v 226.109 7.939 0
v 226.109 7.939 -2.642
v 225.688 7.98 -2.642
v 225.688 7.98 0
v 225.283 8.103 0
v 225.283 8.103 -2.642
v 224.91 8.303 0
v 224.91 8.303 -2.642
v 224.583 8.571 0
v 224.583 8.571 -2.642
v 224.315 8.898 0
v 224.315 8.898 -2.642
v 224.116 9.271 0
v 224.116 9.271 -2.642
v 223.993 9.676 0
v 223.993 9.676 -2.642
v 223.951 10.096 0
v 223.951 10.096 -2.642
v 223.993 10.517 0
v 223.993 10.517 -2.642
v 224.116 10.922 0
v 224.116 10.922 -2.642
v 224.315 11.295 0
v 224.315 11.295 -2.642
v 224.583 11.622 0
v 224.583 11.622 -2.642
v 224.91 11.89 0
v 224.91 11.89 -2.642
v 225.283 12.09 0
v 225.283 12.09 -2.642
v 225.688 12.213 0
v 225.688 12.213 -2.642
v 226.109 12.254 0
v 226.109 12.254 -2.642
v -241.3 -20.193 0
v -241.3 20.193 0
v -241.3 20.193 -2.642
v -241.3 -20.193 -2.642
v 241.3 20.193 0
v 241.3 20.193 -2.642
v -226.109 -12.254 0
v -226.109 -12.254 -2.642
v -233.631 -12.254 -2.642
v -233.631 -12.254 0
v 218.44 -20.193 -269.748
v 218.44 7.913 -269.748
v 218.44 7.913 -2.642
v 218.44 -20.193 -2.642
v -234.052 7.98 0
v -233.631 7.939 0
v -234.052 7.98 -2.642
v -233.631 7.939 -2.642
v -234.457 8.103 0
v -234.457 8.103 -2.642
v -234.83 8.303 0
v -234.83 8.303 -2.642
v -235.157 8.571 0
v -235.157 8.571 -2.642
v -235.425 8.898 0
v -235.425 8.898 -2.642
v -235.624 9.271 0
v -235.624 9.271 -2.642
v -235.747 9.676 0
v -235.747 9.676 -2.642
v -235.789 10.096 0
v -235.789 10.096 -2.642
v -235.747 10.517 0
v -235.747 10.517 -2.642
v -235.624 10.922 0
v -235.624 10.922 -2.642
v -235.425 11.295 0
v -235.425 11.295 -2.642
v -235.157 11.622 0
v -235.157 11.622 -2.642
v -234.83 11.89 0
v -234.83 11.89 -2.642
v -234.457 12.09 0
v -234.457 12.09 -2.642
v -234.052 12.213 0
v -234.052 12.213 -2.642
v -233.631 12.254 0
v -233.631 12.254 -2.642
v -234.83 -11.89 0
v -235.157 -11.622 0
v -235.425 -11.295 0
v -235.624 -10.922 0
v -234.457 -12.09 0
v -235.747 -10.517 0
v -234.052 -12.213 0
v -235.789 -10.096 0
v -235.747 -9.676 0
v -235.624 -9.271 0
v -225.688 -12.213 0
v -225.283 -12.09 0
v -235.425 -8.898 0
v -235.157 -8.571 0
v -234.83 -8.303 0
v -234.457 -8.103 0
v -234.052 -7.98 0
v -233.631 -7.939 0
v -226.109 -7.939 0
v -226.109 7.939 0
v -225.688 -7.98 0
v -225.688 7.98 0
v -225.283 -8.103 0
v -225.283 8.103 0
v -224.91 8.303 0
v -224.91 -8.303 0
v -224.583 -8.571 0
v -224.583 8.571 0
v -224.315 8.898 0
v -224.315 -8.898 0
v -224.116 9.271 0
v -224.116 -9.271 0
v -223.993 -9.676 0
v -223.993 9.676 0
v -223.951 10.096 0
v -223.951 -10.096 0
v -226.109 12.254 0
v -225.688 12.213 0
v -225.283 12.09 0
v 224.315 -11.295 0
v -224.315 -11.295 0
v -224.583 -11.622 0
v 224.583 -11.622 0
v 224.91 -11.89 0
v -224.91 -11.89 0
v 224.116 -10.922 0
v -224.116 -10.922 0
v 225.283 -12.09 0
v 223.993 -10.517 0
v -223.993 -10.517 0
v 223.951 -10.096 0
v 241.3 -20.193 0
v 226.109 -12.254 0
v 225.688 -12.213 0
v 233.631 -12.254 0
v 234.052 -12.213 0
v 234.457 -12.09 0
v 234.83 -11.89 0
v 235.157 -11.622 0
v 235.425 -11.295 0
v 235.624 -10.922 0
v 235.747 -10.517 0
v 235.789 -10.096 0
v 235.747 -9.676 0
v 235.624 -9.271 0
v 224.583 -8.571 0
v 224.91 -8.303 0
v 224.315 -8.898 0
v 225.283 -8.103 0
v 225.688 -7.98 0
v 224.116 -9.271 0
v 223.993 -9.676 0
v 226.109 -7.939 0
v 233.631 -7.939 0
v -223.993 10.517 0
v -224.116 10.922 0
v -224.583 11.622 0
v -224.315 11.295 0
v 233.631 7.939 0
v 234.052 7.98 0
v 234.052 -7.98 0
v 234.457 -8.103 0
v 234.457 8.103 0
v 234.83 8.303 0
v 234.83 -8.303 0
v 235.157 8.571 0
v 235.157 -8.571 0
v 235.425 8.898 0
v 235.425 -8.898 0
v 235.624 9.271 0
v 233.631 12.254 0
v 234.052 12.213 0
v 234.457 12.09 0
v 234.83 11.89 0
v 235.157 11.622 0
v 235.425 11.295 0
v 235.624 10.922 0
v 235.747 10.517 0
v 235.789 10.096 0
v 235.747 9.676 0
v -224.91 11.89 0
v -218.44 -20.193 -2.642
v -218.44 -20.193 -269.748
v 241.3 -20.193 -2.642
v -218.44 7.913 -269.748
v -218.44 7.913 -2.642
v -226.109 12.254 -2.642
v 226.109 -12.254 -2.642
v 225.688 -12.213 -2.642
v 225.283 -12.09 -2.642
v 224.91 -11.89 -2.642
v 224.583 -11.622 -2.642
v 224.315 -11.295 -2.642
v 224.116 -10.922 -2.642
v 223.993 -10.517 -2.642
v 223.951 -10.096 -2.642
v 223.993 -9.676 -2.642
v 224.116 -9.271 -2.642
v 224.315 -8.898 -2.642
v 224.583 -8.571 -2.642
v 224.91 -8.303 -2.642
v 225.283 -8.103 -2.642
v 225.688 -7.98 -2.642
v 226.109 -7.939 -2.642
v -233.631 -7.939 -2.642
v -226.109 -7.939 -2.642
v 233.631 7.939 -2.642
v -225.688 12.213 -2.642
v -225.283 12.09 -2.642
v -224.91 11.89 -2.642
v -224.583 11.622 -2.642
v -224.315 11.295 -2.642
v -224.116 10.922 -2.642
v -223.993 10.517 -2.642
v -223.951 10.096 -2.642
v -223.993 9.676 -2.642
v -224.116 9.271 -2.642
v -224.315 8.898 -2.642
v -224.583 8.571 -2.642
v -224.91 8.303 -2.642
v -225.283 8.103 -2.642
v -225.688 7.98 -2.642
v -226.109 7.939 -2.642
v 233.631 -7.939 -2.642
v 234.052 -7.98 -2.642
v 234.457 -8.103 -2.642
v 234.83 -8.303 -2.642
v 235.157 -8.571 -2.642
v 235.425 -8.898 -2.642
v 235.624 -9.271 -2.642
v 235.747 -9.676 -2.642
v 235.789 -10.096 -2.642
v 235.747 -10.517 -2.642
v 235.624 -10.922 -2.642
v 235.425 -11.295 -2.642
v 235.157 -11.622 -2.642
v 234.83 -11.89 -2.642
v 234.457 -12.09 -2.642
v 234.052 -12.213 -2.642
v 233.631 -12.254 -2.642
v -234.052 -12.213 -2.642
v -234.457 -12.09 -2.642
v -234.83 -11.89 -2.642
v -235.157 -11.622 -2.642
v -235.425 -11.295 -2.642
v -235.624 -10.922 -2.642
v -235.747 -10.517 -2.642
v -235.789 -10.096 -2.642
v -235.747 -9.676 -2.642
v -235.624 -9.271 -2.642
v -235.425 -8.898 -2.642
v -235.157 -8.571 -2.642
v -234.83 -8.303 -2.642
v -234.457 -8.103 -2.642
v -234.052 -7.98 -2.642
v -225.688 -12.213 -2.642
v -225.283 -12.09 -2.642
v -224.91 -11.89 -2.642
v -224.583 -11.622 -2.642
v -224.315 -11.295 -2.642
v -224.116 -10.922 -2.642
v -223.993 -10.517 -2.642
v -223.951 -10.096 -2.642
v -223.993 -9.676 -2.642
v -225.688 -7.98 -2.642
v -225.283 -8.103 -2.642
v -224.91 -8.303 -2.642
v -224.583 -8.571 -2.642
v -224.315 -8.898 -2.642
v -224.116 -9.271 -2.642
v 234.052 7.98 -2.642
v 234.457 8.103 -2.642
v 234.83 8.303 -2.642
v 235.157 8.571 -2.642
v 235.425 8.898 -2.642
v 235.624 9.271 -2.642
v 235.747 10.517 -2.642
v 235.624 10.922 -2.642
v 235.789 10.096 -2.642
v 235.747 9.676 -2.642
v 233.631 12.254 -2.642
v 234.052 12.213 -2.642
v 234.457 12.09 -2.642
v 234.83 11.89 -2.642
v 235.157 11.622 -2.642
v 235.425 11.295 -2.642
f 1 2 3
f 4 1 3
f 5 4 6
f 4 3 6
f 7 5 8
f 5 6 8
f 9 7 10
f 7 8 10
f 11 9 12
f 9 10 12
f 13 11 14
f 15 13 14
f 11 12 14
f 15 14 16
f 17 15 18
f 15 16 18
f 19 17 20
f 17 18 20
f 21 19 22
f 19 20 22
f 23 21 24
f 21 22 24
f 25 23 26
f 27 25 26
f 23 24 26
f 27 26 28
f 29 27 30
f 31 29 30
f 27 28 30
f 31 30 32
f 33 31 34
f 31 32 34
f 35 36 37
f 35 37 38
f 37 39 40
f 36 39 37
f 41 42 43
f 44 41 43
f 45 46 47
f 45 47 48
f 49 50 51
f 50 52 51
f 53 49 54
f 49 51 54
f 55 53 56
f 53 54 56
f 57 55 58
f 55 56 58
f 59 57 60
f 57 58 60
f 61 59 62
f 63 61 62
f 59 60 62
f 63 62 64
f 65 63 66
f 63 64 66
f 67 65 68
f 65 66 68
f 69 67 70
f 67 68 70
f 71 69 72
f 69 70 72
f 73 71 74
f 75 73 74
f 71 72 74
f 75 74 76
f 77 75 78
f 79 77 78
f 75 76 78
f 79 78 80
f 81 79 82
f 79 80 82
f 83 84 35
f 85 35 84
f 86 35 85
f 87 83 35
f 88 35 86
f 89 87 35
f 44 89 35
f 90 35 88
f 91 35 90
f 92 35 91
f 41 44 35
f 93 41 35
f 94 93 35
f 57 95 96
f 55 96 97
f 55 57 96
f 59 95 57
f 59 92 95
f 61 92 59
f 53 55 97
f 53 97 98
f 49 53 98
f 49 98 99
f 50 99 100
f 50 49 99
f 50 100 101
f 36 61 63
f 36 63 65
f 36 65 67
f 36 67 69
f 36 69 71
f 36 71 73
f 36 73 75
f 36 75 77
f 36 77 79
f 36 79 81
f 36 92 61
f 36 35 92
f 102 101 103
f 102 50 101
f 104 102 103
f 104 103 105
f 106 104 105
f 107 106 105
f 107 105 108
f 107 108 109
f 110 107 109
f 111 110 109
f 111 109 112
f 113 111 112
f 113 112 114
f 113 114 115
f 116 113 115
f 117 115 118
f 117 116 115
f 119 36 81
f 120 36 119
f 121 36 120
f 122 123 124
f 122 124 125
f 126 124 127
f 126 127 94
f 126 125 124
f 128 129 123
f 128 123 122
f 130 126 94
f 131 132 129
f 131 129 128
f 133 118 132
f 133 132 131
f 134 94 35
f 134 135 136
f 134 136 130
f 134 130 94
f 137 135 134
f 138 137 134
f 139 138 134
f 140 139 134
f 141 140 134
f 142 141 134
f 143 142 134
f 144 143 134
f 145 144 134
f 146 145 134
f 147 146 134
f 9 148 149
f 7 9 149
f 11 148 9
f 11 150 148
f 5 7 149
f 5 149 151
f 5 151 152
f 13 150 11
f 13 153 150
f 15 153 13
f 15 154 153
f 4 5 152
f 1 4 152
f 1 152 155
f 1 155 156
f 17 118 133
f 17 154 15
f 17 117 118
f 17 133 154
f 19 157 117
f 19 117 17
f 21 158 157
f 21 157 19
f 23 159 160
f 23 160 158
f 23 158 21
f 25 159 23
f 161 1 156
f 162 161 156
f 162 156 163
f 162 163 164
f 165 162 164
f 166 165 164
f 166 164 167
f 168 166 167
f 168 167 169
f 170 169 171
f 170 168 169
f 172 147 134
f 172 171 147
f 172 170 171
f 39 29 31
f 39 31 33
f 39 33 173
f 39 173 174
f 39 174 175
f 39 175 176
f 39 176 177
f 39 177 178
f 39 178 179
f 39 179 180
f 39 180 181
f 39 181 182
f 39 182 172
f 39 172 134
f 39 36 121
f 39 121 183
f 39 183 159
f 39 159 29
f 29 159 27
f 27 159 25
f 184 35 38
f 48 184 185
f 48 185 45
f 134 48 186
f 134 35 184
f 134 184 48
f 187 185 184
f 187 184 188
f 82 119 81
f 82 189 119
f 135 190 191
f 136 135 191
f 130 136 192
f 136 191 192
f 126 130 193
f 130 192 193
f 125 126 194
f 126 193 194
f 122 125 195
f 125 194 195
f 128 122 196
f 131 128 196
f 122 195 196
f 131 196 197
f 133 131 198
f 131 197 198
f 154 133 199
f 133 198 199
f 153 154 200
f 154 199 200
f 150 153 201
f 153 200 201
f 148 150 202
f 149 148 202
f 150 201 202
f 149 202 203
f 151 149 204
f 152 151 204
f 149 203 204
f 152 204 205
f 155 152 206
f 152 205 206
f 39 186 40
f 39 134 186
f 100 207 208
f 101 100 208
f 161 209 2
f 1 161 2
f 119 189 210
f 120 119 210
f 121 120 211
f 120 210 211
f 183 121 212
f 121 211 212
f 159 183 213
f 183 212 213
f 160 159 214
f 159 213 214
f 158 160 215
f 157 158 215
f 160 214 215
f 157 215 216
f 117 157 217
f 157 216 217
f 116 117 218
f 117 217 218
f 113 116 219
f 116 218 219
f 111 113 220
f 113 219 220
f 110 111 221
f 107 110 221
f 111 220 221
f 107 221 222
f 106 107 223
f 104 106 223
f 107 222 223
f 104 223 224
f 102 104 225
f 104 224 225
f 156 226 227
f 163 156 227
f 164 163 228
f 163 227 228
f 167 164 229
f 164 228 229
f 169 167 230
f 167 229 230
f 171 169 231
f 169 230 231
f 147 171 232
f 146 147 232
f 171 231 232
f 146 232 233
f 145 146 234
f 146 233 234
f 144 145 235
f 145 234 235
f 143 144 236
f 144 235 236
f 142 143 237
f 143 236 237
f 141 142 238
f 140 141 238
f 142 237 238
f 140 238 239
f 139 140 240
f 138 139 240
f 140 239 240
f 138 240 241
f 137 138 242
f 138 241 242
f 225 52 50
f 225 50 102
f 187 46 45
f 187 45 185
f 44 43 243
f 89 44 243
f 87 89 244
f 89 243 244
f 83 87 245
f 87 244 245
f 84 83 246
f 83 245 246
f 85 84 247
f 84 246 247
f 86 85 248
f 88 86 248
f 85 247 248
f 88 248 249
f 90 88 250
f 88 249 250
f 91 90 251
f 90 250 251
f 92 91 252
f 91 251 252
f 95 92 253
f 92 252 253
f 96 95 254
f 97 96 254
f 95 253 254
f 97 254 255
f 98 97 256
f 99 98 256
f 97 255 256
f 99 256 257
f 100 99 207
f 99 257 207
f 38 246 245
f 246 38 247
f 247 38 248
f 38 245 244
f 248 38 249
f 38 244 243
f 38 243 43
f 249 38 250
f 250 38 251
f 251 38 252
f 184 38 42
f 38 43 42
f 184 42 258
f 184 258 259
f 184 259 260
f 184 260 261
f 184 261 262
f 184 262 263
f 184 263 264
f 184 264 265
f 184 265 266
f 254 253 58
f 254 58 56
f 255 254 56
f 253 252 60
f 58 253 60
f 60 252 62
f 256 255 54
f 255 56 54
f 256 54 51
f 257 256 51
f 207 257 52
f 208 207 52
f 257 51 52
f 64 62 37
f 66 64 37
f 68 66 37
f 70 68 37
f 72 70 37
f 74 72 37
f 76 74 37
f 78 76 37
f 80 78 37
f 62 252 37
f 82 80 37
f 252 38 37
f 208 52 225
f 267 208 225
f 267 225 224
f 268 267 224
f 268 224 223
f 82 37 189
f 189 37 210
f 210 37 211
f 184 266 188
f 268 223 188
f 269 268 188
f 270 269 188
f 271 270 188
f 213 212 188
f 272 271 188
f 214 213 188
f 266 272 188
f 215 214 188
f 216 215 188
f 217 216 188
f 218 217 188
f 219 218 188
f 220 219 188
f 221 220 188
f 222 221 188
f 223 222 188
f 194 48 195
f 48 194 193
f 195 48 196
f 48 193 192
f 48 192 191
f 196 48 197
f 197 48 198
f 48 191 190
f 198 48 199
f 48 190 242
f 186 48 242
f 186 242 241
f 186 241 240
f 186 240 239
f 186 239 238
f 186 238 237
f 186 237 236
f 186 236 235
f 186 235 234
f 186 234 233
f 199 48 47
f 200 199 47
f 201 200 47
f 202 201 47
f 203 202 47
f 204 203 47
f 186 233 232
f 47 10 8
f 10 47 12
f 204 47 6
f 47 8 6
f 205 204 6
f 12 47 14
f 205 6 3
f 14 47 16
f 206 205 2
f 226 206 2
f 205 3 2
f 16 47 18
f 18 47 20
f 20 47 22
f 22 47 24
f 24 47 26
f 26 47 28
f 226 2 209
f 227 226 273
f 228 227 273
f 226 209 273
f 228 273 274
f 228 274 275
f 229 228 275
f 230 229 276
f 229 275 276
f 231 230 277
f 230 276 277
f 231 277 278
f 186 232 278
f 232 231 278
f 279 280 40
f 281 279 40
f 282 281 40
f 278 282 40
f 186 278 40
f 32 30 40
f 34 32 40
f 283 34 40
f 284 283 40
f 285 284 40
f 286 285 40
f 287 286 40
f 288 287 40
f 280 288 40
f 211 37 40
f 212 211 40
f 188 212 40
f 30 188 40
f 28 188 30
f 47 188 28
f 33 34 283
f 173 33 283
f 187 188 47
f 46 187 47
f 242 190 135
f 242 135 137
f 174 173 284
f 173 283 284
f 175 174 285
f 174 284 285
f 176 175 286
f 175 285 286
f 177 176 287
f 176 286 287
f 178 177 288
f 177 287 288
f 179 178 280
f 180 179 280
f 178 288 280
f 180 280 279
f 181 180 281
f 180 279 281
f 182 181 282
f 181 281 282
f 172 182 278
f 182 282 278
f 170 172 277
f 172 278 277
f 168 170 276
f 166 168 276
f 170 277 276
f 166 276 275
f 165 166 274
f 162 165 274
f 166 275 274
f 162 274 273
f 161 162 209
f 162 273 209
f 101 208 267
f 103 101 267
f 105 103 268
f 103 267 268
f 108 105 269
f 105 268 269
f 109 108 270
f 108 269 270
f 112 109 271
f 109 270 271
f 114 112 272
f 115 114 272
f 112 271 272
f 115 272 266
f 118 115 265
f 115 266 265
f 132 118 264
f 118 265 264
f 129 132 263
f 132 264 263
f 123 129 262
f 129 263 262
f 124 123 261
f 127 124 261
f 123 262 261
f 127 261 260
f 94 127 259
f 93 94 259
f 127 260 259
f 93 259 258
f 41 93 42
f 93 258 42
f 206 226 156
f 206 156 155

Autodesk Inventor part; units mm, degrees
ref_plane "YZ Plane" through (0, 0, 0) normal (1, 0, 0) x (0, 1, 0)
ref_plane "XZ Plane" through (0, 0, 0) normal (0, 1, 0) x (-1, 0, 0)
ref_plane "XY Plane" through (0, 0, 0) normal (0, 0, 1) x (1, 0, 0)
sketch "Sketch1" plane through (0, 0, 0) normal (0, 0, 1) x (1, 0, 0)
  line L0 (-241.3, -20.193) -> (241.3, -20.193)
  line L1 (241.3, -20.193) -> (241.3, 20.193)
  line L2 (241.3, 20.193) -> (-241.3, 20.193)
  line L3 (-241.3, 20.193) -> (-241.3, -20.193)
  line L4 (-241.3, -20.193) -> (241.3, 20.193) construction
  line L5 (241.3, -20.193) -> (-241.3, 20.193) construction
  point P0 (0, 0)
  dimension "d0" = 482.6
  dimension "d1" = 40.386
extrude "Extrusion1" add sketch "Sketch1" against normal blind 2.6416
sketch "Sketch2" plane through (0, 0, -2.6416) normal (0, 0, -1) x (-1, 0, 0)
  line L0 (-241.3, -20.193) -> (241.3, -20.193) projected
  line L1 (-218.44, -20.193) -> (218.44, -20.193)
  line L2 (218.44, -20.193) -> (218.44, 7.913)
  line L3 (218.44, 7.913) -> (-218.44, 7.913)
  line L4 (-218.44, 7.913) -> (-218.44, -20.193)
  line L5 (0, -20.193) -> (0, 20.193) construction
  line L6 (241.3, 20.193) -> (-241.3, 20.193) projected
  point P0 (0, 0)
  dimension "d4" = 436.88
extrude "Extrusion2" add sketch "Sketch2" along normal blind 267.1064
sketch "Sketch3" plane through (0, 0, -2.6416) normal (0, 0, -1) x (-1, 0, 0)
  line L0 (-241.3, -20.193) -> (-218.44, -20.193) projected
  line L1 (-229.87, -20.193) -> (-229.87, 20.193) construction
  line L2 (229.87, -20.193) -> (229.87, 20.193) construction
  line L3 (241.3, -20.193) -> (241.3, 20.193) construction
  line L4 (241.3, 20.193) -> (-241.3, 20.193) construction
  line L5 (218.44, -20.193) -> (241.3, -20.193) construction
  line L6 (-233.6311, 10.0965) -> (-226.1089, 10.0965) construction
  line L7 (-233.6311, 7.939) -> (-226.1089, 7.939)
  line L8 (-226.1089, 12.254) -> (-233.6311, 12.254)
  arc A0 (-233.6311, 12.254) -> (-233.6311, 7.939) centre (-233.6311, 10.0965) ccw
  arc A1 (-226.1089, 7.939) -> (-226.1089, 12.254) centre (-226.1089, 10.0965) ccw
  line L9 (-241.3, 0) -> (241.3, 0) construction
  line L10 (-241.3, 20.193) -> (-241.3, -20.193) projected
  line L11 (-233.6311, -10.0965) -> (-226.1089, -10.0965) construction
  line L12 (-233.6311, -7.939) -> (-226.1089, -7.939)
  line L13 (-226.1089, -12.254) -> (-233.6311, -12.254)
  arc A2 (-233.6311, -7.939) -> (-233.6311, -12.254) centre (-233.6311, -10.0965) ccw
  arc A3 (-226.1089, -12.254) -> (-226.1089, -7.939) centre (-226.1089, -10.0965) ccw
  line L14 (0, 20.193) -> (0, -20.193) construction
  line L15 (-218.44, -20.193) -> (218.44, -20.193) projected
  line L16 (233.6311, 10.0965) -> (226.1089, 10.0965) construction
  line L17 (233.6311, 7.939) -> (226.1089, 7.939)
  line L18 (226.1089, 12.254) -> (233.6311, 12.254)
  arc A4 (233.6311, 7.939) -> (233.6311, 12.254) centre (233.6311, 10.0965) ccw
  arc A5 (226.1089, 12.254) -> (226.1089, 7.939) centre (226.1089, 10.0965) ccw
  arc A6 (226.1089, -7.939) -> (226.1089, -12.254) centre (226.1089, -10.0965) ccw
  line L19 (233.6311, -10.0965) -> (226.1089, -10.0965) construction
  line L20 (233.6311, -7.939) -> (226.1089, -7.939)
  line L21 (226.1089, -12.254) -> (233.6311, -12.254)
  arc A7 (233.6311, -12.254) -> (233.6311, -7.939) centre (233.6311, -10.0965) ccw
  point P0 (0, 0)
  point P1 (-229.87, 10.0965)
  point P2 (-229.87, -10.0965)
  point P3 (229.87, 10.0965)
  point P4 (229.87, -10.0965)
  dimension "d7" = 11.43
  dimension "d8" = 10.0965
extrude "Extrusion3" cut sketch "Sketch3" against normal up to surface (2.6416 mm away)
properties part number "PatchPanel_rep"
